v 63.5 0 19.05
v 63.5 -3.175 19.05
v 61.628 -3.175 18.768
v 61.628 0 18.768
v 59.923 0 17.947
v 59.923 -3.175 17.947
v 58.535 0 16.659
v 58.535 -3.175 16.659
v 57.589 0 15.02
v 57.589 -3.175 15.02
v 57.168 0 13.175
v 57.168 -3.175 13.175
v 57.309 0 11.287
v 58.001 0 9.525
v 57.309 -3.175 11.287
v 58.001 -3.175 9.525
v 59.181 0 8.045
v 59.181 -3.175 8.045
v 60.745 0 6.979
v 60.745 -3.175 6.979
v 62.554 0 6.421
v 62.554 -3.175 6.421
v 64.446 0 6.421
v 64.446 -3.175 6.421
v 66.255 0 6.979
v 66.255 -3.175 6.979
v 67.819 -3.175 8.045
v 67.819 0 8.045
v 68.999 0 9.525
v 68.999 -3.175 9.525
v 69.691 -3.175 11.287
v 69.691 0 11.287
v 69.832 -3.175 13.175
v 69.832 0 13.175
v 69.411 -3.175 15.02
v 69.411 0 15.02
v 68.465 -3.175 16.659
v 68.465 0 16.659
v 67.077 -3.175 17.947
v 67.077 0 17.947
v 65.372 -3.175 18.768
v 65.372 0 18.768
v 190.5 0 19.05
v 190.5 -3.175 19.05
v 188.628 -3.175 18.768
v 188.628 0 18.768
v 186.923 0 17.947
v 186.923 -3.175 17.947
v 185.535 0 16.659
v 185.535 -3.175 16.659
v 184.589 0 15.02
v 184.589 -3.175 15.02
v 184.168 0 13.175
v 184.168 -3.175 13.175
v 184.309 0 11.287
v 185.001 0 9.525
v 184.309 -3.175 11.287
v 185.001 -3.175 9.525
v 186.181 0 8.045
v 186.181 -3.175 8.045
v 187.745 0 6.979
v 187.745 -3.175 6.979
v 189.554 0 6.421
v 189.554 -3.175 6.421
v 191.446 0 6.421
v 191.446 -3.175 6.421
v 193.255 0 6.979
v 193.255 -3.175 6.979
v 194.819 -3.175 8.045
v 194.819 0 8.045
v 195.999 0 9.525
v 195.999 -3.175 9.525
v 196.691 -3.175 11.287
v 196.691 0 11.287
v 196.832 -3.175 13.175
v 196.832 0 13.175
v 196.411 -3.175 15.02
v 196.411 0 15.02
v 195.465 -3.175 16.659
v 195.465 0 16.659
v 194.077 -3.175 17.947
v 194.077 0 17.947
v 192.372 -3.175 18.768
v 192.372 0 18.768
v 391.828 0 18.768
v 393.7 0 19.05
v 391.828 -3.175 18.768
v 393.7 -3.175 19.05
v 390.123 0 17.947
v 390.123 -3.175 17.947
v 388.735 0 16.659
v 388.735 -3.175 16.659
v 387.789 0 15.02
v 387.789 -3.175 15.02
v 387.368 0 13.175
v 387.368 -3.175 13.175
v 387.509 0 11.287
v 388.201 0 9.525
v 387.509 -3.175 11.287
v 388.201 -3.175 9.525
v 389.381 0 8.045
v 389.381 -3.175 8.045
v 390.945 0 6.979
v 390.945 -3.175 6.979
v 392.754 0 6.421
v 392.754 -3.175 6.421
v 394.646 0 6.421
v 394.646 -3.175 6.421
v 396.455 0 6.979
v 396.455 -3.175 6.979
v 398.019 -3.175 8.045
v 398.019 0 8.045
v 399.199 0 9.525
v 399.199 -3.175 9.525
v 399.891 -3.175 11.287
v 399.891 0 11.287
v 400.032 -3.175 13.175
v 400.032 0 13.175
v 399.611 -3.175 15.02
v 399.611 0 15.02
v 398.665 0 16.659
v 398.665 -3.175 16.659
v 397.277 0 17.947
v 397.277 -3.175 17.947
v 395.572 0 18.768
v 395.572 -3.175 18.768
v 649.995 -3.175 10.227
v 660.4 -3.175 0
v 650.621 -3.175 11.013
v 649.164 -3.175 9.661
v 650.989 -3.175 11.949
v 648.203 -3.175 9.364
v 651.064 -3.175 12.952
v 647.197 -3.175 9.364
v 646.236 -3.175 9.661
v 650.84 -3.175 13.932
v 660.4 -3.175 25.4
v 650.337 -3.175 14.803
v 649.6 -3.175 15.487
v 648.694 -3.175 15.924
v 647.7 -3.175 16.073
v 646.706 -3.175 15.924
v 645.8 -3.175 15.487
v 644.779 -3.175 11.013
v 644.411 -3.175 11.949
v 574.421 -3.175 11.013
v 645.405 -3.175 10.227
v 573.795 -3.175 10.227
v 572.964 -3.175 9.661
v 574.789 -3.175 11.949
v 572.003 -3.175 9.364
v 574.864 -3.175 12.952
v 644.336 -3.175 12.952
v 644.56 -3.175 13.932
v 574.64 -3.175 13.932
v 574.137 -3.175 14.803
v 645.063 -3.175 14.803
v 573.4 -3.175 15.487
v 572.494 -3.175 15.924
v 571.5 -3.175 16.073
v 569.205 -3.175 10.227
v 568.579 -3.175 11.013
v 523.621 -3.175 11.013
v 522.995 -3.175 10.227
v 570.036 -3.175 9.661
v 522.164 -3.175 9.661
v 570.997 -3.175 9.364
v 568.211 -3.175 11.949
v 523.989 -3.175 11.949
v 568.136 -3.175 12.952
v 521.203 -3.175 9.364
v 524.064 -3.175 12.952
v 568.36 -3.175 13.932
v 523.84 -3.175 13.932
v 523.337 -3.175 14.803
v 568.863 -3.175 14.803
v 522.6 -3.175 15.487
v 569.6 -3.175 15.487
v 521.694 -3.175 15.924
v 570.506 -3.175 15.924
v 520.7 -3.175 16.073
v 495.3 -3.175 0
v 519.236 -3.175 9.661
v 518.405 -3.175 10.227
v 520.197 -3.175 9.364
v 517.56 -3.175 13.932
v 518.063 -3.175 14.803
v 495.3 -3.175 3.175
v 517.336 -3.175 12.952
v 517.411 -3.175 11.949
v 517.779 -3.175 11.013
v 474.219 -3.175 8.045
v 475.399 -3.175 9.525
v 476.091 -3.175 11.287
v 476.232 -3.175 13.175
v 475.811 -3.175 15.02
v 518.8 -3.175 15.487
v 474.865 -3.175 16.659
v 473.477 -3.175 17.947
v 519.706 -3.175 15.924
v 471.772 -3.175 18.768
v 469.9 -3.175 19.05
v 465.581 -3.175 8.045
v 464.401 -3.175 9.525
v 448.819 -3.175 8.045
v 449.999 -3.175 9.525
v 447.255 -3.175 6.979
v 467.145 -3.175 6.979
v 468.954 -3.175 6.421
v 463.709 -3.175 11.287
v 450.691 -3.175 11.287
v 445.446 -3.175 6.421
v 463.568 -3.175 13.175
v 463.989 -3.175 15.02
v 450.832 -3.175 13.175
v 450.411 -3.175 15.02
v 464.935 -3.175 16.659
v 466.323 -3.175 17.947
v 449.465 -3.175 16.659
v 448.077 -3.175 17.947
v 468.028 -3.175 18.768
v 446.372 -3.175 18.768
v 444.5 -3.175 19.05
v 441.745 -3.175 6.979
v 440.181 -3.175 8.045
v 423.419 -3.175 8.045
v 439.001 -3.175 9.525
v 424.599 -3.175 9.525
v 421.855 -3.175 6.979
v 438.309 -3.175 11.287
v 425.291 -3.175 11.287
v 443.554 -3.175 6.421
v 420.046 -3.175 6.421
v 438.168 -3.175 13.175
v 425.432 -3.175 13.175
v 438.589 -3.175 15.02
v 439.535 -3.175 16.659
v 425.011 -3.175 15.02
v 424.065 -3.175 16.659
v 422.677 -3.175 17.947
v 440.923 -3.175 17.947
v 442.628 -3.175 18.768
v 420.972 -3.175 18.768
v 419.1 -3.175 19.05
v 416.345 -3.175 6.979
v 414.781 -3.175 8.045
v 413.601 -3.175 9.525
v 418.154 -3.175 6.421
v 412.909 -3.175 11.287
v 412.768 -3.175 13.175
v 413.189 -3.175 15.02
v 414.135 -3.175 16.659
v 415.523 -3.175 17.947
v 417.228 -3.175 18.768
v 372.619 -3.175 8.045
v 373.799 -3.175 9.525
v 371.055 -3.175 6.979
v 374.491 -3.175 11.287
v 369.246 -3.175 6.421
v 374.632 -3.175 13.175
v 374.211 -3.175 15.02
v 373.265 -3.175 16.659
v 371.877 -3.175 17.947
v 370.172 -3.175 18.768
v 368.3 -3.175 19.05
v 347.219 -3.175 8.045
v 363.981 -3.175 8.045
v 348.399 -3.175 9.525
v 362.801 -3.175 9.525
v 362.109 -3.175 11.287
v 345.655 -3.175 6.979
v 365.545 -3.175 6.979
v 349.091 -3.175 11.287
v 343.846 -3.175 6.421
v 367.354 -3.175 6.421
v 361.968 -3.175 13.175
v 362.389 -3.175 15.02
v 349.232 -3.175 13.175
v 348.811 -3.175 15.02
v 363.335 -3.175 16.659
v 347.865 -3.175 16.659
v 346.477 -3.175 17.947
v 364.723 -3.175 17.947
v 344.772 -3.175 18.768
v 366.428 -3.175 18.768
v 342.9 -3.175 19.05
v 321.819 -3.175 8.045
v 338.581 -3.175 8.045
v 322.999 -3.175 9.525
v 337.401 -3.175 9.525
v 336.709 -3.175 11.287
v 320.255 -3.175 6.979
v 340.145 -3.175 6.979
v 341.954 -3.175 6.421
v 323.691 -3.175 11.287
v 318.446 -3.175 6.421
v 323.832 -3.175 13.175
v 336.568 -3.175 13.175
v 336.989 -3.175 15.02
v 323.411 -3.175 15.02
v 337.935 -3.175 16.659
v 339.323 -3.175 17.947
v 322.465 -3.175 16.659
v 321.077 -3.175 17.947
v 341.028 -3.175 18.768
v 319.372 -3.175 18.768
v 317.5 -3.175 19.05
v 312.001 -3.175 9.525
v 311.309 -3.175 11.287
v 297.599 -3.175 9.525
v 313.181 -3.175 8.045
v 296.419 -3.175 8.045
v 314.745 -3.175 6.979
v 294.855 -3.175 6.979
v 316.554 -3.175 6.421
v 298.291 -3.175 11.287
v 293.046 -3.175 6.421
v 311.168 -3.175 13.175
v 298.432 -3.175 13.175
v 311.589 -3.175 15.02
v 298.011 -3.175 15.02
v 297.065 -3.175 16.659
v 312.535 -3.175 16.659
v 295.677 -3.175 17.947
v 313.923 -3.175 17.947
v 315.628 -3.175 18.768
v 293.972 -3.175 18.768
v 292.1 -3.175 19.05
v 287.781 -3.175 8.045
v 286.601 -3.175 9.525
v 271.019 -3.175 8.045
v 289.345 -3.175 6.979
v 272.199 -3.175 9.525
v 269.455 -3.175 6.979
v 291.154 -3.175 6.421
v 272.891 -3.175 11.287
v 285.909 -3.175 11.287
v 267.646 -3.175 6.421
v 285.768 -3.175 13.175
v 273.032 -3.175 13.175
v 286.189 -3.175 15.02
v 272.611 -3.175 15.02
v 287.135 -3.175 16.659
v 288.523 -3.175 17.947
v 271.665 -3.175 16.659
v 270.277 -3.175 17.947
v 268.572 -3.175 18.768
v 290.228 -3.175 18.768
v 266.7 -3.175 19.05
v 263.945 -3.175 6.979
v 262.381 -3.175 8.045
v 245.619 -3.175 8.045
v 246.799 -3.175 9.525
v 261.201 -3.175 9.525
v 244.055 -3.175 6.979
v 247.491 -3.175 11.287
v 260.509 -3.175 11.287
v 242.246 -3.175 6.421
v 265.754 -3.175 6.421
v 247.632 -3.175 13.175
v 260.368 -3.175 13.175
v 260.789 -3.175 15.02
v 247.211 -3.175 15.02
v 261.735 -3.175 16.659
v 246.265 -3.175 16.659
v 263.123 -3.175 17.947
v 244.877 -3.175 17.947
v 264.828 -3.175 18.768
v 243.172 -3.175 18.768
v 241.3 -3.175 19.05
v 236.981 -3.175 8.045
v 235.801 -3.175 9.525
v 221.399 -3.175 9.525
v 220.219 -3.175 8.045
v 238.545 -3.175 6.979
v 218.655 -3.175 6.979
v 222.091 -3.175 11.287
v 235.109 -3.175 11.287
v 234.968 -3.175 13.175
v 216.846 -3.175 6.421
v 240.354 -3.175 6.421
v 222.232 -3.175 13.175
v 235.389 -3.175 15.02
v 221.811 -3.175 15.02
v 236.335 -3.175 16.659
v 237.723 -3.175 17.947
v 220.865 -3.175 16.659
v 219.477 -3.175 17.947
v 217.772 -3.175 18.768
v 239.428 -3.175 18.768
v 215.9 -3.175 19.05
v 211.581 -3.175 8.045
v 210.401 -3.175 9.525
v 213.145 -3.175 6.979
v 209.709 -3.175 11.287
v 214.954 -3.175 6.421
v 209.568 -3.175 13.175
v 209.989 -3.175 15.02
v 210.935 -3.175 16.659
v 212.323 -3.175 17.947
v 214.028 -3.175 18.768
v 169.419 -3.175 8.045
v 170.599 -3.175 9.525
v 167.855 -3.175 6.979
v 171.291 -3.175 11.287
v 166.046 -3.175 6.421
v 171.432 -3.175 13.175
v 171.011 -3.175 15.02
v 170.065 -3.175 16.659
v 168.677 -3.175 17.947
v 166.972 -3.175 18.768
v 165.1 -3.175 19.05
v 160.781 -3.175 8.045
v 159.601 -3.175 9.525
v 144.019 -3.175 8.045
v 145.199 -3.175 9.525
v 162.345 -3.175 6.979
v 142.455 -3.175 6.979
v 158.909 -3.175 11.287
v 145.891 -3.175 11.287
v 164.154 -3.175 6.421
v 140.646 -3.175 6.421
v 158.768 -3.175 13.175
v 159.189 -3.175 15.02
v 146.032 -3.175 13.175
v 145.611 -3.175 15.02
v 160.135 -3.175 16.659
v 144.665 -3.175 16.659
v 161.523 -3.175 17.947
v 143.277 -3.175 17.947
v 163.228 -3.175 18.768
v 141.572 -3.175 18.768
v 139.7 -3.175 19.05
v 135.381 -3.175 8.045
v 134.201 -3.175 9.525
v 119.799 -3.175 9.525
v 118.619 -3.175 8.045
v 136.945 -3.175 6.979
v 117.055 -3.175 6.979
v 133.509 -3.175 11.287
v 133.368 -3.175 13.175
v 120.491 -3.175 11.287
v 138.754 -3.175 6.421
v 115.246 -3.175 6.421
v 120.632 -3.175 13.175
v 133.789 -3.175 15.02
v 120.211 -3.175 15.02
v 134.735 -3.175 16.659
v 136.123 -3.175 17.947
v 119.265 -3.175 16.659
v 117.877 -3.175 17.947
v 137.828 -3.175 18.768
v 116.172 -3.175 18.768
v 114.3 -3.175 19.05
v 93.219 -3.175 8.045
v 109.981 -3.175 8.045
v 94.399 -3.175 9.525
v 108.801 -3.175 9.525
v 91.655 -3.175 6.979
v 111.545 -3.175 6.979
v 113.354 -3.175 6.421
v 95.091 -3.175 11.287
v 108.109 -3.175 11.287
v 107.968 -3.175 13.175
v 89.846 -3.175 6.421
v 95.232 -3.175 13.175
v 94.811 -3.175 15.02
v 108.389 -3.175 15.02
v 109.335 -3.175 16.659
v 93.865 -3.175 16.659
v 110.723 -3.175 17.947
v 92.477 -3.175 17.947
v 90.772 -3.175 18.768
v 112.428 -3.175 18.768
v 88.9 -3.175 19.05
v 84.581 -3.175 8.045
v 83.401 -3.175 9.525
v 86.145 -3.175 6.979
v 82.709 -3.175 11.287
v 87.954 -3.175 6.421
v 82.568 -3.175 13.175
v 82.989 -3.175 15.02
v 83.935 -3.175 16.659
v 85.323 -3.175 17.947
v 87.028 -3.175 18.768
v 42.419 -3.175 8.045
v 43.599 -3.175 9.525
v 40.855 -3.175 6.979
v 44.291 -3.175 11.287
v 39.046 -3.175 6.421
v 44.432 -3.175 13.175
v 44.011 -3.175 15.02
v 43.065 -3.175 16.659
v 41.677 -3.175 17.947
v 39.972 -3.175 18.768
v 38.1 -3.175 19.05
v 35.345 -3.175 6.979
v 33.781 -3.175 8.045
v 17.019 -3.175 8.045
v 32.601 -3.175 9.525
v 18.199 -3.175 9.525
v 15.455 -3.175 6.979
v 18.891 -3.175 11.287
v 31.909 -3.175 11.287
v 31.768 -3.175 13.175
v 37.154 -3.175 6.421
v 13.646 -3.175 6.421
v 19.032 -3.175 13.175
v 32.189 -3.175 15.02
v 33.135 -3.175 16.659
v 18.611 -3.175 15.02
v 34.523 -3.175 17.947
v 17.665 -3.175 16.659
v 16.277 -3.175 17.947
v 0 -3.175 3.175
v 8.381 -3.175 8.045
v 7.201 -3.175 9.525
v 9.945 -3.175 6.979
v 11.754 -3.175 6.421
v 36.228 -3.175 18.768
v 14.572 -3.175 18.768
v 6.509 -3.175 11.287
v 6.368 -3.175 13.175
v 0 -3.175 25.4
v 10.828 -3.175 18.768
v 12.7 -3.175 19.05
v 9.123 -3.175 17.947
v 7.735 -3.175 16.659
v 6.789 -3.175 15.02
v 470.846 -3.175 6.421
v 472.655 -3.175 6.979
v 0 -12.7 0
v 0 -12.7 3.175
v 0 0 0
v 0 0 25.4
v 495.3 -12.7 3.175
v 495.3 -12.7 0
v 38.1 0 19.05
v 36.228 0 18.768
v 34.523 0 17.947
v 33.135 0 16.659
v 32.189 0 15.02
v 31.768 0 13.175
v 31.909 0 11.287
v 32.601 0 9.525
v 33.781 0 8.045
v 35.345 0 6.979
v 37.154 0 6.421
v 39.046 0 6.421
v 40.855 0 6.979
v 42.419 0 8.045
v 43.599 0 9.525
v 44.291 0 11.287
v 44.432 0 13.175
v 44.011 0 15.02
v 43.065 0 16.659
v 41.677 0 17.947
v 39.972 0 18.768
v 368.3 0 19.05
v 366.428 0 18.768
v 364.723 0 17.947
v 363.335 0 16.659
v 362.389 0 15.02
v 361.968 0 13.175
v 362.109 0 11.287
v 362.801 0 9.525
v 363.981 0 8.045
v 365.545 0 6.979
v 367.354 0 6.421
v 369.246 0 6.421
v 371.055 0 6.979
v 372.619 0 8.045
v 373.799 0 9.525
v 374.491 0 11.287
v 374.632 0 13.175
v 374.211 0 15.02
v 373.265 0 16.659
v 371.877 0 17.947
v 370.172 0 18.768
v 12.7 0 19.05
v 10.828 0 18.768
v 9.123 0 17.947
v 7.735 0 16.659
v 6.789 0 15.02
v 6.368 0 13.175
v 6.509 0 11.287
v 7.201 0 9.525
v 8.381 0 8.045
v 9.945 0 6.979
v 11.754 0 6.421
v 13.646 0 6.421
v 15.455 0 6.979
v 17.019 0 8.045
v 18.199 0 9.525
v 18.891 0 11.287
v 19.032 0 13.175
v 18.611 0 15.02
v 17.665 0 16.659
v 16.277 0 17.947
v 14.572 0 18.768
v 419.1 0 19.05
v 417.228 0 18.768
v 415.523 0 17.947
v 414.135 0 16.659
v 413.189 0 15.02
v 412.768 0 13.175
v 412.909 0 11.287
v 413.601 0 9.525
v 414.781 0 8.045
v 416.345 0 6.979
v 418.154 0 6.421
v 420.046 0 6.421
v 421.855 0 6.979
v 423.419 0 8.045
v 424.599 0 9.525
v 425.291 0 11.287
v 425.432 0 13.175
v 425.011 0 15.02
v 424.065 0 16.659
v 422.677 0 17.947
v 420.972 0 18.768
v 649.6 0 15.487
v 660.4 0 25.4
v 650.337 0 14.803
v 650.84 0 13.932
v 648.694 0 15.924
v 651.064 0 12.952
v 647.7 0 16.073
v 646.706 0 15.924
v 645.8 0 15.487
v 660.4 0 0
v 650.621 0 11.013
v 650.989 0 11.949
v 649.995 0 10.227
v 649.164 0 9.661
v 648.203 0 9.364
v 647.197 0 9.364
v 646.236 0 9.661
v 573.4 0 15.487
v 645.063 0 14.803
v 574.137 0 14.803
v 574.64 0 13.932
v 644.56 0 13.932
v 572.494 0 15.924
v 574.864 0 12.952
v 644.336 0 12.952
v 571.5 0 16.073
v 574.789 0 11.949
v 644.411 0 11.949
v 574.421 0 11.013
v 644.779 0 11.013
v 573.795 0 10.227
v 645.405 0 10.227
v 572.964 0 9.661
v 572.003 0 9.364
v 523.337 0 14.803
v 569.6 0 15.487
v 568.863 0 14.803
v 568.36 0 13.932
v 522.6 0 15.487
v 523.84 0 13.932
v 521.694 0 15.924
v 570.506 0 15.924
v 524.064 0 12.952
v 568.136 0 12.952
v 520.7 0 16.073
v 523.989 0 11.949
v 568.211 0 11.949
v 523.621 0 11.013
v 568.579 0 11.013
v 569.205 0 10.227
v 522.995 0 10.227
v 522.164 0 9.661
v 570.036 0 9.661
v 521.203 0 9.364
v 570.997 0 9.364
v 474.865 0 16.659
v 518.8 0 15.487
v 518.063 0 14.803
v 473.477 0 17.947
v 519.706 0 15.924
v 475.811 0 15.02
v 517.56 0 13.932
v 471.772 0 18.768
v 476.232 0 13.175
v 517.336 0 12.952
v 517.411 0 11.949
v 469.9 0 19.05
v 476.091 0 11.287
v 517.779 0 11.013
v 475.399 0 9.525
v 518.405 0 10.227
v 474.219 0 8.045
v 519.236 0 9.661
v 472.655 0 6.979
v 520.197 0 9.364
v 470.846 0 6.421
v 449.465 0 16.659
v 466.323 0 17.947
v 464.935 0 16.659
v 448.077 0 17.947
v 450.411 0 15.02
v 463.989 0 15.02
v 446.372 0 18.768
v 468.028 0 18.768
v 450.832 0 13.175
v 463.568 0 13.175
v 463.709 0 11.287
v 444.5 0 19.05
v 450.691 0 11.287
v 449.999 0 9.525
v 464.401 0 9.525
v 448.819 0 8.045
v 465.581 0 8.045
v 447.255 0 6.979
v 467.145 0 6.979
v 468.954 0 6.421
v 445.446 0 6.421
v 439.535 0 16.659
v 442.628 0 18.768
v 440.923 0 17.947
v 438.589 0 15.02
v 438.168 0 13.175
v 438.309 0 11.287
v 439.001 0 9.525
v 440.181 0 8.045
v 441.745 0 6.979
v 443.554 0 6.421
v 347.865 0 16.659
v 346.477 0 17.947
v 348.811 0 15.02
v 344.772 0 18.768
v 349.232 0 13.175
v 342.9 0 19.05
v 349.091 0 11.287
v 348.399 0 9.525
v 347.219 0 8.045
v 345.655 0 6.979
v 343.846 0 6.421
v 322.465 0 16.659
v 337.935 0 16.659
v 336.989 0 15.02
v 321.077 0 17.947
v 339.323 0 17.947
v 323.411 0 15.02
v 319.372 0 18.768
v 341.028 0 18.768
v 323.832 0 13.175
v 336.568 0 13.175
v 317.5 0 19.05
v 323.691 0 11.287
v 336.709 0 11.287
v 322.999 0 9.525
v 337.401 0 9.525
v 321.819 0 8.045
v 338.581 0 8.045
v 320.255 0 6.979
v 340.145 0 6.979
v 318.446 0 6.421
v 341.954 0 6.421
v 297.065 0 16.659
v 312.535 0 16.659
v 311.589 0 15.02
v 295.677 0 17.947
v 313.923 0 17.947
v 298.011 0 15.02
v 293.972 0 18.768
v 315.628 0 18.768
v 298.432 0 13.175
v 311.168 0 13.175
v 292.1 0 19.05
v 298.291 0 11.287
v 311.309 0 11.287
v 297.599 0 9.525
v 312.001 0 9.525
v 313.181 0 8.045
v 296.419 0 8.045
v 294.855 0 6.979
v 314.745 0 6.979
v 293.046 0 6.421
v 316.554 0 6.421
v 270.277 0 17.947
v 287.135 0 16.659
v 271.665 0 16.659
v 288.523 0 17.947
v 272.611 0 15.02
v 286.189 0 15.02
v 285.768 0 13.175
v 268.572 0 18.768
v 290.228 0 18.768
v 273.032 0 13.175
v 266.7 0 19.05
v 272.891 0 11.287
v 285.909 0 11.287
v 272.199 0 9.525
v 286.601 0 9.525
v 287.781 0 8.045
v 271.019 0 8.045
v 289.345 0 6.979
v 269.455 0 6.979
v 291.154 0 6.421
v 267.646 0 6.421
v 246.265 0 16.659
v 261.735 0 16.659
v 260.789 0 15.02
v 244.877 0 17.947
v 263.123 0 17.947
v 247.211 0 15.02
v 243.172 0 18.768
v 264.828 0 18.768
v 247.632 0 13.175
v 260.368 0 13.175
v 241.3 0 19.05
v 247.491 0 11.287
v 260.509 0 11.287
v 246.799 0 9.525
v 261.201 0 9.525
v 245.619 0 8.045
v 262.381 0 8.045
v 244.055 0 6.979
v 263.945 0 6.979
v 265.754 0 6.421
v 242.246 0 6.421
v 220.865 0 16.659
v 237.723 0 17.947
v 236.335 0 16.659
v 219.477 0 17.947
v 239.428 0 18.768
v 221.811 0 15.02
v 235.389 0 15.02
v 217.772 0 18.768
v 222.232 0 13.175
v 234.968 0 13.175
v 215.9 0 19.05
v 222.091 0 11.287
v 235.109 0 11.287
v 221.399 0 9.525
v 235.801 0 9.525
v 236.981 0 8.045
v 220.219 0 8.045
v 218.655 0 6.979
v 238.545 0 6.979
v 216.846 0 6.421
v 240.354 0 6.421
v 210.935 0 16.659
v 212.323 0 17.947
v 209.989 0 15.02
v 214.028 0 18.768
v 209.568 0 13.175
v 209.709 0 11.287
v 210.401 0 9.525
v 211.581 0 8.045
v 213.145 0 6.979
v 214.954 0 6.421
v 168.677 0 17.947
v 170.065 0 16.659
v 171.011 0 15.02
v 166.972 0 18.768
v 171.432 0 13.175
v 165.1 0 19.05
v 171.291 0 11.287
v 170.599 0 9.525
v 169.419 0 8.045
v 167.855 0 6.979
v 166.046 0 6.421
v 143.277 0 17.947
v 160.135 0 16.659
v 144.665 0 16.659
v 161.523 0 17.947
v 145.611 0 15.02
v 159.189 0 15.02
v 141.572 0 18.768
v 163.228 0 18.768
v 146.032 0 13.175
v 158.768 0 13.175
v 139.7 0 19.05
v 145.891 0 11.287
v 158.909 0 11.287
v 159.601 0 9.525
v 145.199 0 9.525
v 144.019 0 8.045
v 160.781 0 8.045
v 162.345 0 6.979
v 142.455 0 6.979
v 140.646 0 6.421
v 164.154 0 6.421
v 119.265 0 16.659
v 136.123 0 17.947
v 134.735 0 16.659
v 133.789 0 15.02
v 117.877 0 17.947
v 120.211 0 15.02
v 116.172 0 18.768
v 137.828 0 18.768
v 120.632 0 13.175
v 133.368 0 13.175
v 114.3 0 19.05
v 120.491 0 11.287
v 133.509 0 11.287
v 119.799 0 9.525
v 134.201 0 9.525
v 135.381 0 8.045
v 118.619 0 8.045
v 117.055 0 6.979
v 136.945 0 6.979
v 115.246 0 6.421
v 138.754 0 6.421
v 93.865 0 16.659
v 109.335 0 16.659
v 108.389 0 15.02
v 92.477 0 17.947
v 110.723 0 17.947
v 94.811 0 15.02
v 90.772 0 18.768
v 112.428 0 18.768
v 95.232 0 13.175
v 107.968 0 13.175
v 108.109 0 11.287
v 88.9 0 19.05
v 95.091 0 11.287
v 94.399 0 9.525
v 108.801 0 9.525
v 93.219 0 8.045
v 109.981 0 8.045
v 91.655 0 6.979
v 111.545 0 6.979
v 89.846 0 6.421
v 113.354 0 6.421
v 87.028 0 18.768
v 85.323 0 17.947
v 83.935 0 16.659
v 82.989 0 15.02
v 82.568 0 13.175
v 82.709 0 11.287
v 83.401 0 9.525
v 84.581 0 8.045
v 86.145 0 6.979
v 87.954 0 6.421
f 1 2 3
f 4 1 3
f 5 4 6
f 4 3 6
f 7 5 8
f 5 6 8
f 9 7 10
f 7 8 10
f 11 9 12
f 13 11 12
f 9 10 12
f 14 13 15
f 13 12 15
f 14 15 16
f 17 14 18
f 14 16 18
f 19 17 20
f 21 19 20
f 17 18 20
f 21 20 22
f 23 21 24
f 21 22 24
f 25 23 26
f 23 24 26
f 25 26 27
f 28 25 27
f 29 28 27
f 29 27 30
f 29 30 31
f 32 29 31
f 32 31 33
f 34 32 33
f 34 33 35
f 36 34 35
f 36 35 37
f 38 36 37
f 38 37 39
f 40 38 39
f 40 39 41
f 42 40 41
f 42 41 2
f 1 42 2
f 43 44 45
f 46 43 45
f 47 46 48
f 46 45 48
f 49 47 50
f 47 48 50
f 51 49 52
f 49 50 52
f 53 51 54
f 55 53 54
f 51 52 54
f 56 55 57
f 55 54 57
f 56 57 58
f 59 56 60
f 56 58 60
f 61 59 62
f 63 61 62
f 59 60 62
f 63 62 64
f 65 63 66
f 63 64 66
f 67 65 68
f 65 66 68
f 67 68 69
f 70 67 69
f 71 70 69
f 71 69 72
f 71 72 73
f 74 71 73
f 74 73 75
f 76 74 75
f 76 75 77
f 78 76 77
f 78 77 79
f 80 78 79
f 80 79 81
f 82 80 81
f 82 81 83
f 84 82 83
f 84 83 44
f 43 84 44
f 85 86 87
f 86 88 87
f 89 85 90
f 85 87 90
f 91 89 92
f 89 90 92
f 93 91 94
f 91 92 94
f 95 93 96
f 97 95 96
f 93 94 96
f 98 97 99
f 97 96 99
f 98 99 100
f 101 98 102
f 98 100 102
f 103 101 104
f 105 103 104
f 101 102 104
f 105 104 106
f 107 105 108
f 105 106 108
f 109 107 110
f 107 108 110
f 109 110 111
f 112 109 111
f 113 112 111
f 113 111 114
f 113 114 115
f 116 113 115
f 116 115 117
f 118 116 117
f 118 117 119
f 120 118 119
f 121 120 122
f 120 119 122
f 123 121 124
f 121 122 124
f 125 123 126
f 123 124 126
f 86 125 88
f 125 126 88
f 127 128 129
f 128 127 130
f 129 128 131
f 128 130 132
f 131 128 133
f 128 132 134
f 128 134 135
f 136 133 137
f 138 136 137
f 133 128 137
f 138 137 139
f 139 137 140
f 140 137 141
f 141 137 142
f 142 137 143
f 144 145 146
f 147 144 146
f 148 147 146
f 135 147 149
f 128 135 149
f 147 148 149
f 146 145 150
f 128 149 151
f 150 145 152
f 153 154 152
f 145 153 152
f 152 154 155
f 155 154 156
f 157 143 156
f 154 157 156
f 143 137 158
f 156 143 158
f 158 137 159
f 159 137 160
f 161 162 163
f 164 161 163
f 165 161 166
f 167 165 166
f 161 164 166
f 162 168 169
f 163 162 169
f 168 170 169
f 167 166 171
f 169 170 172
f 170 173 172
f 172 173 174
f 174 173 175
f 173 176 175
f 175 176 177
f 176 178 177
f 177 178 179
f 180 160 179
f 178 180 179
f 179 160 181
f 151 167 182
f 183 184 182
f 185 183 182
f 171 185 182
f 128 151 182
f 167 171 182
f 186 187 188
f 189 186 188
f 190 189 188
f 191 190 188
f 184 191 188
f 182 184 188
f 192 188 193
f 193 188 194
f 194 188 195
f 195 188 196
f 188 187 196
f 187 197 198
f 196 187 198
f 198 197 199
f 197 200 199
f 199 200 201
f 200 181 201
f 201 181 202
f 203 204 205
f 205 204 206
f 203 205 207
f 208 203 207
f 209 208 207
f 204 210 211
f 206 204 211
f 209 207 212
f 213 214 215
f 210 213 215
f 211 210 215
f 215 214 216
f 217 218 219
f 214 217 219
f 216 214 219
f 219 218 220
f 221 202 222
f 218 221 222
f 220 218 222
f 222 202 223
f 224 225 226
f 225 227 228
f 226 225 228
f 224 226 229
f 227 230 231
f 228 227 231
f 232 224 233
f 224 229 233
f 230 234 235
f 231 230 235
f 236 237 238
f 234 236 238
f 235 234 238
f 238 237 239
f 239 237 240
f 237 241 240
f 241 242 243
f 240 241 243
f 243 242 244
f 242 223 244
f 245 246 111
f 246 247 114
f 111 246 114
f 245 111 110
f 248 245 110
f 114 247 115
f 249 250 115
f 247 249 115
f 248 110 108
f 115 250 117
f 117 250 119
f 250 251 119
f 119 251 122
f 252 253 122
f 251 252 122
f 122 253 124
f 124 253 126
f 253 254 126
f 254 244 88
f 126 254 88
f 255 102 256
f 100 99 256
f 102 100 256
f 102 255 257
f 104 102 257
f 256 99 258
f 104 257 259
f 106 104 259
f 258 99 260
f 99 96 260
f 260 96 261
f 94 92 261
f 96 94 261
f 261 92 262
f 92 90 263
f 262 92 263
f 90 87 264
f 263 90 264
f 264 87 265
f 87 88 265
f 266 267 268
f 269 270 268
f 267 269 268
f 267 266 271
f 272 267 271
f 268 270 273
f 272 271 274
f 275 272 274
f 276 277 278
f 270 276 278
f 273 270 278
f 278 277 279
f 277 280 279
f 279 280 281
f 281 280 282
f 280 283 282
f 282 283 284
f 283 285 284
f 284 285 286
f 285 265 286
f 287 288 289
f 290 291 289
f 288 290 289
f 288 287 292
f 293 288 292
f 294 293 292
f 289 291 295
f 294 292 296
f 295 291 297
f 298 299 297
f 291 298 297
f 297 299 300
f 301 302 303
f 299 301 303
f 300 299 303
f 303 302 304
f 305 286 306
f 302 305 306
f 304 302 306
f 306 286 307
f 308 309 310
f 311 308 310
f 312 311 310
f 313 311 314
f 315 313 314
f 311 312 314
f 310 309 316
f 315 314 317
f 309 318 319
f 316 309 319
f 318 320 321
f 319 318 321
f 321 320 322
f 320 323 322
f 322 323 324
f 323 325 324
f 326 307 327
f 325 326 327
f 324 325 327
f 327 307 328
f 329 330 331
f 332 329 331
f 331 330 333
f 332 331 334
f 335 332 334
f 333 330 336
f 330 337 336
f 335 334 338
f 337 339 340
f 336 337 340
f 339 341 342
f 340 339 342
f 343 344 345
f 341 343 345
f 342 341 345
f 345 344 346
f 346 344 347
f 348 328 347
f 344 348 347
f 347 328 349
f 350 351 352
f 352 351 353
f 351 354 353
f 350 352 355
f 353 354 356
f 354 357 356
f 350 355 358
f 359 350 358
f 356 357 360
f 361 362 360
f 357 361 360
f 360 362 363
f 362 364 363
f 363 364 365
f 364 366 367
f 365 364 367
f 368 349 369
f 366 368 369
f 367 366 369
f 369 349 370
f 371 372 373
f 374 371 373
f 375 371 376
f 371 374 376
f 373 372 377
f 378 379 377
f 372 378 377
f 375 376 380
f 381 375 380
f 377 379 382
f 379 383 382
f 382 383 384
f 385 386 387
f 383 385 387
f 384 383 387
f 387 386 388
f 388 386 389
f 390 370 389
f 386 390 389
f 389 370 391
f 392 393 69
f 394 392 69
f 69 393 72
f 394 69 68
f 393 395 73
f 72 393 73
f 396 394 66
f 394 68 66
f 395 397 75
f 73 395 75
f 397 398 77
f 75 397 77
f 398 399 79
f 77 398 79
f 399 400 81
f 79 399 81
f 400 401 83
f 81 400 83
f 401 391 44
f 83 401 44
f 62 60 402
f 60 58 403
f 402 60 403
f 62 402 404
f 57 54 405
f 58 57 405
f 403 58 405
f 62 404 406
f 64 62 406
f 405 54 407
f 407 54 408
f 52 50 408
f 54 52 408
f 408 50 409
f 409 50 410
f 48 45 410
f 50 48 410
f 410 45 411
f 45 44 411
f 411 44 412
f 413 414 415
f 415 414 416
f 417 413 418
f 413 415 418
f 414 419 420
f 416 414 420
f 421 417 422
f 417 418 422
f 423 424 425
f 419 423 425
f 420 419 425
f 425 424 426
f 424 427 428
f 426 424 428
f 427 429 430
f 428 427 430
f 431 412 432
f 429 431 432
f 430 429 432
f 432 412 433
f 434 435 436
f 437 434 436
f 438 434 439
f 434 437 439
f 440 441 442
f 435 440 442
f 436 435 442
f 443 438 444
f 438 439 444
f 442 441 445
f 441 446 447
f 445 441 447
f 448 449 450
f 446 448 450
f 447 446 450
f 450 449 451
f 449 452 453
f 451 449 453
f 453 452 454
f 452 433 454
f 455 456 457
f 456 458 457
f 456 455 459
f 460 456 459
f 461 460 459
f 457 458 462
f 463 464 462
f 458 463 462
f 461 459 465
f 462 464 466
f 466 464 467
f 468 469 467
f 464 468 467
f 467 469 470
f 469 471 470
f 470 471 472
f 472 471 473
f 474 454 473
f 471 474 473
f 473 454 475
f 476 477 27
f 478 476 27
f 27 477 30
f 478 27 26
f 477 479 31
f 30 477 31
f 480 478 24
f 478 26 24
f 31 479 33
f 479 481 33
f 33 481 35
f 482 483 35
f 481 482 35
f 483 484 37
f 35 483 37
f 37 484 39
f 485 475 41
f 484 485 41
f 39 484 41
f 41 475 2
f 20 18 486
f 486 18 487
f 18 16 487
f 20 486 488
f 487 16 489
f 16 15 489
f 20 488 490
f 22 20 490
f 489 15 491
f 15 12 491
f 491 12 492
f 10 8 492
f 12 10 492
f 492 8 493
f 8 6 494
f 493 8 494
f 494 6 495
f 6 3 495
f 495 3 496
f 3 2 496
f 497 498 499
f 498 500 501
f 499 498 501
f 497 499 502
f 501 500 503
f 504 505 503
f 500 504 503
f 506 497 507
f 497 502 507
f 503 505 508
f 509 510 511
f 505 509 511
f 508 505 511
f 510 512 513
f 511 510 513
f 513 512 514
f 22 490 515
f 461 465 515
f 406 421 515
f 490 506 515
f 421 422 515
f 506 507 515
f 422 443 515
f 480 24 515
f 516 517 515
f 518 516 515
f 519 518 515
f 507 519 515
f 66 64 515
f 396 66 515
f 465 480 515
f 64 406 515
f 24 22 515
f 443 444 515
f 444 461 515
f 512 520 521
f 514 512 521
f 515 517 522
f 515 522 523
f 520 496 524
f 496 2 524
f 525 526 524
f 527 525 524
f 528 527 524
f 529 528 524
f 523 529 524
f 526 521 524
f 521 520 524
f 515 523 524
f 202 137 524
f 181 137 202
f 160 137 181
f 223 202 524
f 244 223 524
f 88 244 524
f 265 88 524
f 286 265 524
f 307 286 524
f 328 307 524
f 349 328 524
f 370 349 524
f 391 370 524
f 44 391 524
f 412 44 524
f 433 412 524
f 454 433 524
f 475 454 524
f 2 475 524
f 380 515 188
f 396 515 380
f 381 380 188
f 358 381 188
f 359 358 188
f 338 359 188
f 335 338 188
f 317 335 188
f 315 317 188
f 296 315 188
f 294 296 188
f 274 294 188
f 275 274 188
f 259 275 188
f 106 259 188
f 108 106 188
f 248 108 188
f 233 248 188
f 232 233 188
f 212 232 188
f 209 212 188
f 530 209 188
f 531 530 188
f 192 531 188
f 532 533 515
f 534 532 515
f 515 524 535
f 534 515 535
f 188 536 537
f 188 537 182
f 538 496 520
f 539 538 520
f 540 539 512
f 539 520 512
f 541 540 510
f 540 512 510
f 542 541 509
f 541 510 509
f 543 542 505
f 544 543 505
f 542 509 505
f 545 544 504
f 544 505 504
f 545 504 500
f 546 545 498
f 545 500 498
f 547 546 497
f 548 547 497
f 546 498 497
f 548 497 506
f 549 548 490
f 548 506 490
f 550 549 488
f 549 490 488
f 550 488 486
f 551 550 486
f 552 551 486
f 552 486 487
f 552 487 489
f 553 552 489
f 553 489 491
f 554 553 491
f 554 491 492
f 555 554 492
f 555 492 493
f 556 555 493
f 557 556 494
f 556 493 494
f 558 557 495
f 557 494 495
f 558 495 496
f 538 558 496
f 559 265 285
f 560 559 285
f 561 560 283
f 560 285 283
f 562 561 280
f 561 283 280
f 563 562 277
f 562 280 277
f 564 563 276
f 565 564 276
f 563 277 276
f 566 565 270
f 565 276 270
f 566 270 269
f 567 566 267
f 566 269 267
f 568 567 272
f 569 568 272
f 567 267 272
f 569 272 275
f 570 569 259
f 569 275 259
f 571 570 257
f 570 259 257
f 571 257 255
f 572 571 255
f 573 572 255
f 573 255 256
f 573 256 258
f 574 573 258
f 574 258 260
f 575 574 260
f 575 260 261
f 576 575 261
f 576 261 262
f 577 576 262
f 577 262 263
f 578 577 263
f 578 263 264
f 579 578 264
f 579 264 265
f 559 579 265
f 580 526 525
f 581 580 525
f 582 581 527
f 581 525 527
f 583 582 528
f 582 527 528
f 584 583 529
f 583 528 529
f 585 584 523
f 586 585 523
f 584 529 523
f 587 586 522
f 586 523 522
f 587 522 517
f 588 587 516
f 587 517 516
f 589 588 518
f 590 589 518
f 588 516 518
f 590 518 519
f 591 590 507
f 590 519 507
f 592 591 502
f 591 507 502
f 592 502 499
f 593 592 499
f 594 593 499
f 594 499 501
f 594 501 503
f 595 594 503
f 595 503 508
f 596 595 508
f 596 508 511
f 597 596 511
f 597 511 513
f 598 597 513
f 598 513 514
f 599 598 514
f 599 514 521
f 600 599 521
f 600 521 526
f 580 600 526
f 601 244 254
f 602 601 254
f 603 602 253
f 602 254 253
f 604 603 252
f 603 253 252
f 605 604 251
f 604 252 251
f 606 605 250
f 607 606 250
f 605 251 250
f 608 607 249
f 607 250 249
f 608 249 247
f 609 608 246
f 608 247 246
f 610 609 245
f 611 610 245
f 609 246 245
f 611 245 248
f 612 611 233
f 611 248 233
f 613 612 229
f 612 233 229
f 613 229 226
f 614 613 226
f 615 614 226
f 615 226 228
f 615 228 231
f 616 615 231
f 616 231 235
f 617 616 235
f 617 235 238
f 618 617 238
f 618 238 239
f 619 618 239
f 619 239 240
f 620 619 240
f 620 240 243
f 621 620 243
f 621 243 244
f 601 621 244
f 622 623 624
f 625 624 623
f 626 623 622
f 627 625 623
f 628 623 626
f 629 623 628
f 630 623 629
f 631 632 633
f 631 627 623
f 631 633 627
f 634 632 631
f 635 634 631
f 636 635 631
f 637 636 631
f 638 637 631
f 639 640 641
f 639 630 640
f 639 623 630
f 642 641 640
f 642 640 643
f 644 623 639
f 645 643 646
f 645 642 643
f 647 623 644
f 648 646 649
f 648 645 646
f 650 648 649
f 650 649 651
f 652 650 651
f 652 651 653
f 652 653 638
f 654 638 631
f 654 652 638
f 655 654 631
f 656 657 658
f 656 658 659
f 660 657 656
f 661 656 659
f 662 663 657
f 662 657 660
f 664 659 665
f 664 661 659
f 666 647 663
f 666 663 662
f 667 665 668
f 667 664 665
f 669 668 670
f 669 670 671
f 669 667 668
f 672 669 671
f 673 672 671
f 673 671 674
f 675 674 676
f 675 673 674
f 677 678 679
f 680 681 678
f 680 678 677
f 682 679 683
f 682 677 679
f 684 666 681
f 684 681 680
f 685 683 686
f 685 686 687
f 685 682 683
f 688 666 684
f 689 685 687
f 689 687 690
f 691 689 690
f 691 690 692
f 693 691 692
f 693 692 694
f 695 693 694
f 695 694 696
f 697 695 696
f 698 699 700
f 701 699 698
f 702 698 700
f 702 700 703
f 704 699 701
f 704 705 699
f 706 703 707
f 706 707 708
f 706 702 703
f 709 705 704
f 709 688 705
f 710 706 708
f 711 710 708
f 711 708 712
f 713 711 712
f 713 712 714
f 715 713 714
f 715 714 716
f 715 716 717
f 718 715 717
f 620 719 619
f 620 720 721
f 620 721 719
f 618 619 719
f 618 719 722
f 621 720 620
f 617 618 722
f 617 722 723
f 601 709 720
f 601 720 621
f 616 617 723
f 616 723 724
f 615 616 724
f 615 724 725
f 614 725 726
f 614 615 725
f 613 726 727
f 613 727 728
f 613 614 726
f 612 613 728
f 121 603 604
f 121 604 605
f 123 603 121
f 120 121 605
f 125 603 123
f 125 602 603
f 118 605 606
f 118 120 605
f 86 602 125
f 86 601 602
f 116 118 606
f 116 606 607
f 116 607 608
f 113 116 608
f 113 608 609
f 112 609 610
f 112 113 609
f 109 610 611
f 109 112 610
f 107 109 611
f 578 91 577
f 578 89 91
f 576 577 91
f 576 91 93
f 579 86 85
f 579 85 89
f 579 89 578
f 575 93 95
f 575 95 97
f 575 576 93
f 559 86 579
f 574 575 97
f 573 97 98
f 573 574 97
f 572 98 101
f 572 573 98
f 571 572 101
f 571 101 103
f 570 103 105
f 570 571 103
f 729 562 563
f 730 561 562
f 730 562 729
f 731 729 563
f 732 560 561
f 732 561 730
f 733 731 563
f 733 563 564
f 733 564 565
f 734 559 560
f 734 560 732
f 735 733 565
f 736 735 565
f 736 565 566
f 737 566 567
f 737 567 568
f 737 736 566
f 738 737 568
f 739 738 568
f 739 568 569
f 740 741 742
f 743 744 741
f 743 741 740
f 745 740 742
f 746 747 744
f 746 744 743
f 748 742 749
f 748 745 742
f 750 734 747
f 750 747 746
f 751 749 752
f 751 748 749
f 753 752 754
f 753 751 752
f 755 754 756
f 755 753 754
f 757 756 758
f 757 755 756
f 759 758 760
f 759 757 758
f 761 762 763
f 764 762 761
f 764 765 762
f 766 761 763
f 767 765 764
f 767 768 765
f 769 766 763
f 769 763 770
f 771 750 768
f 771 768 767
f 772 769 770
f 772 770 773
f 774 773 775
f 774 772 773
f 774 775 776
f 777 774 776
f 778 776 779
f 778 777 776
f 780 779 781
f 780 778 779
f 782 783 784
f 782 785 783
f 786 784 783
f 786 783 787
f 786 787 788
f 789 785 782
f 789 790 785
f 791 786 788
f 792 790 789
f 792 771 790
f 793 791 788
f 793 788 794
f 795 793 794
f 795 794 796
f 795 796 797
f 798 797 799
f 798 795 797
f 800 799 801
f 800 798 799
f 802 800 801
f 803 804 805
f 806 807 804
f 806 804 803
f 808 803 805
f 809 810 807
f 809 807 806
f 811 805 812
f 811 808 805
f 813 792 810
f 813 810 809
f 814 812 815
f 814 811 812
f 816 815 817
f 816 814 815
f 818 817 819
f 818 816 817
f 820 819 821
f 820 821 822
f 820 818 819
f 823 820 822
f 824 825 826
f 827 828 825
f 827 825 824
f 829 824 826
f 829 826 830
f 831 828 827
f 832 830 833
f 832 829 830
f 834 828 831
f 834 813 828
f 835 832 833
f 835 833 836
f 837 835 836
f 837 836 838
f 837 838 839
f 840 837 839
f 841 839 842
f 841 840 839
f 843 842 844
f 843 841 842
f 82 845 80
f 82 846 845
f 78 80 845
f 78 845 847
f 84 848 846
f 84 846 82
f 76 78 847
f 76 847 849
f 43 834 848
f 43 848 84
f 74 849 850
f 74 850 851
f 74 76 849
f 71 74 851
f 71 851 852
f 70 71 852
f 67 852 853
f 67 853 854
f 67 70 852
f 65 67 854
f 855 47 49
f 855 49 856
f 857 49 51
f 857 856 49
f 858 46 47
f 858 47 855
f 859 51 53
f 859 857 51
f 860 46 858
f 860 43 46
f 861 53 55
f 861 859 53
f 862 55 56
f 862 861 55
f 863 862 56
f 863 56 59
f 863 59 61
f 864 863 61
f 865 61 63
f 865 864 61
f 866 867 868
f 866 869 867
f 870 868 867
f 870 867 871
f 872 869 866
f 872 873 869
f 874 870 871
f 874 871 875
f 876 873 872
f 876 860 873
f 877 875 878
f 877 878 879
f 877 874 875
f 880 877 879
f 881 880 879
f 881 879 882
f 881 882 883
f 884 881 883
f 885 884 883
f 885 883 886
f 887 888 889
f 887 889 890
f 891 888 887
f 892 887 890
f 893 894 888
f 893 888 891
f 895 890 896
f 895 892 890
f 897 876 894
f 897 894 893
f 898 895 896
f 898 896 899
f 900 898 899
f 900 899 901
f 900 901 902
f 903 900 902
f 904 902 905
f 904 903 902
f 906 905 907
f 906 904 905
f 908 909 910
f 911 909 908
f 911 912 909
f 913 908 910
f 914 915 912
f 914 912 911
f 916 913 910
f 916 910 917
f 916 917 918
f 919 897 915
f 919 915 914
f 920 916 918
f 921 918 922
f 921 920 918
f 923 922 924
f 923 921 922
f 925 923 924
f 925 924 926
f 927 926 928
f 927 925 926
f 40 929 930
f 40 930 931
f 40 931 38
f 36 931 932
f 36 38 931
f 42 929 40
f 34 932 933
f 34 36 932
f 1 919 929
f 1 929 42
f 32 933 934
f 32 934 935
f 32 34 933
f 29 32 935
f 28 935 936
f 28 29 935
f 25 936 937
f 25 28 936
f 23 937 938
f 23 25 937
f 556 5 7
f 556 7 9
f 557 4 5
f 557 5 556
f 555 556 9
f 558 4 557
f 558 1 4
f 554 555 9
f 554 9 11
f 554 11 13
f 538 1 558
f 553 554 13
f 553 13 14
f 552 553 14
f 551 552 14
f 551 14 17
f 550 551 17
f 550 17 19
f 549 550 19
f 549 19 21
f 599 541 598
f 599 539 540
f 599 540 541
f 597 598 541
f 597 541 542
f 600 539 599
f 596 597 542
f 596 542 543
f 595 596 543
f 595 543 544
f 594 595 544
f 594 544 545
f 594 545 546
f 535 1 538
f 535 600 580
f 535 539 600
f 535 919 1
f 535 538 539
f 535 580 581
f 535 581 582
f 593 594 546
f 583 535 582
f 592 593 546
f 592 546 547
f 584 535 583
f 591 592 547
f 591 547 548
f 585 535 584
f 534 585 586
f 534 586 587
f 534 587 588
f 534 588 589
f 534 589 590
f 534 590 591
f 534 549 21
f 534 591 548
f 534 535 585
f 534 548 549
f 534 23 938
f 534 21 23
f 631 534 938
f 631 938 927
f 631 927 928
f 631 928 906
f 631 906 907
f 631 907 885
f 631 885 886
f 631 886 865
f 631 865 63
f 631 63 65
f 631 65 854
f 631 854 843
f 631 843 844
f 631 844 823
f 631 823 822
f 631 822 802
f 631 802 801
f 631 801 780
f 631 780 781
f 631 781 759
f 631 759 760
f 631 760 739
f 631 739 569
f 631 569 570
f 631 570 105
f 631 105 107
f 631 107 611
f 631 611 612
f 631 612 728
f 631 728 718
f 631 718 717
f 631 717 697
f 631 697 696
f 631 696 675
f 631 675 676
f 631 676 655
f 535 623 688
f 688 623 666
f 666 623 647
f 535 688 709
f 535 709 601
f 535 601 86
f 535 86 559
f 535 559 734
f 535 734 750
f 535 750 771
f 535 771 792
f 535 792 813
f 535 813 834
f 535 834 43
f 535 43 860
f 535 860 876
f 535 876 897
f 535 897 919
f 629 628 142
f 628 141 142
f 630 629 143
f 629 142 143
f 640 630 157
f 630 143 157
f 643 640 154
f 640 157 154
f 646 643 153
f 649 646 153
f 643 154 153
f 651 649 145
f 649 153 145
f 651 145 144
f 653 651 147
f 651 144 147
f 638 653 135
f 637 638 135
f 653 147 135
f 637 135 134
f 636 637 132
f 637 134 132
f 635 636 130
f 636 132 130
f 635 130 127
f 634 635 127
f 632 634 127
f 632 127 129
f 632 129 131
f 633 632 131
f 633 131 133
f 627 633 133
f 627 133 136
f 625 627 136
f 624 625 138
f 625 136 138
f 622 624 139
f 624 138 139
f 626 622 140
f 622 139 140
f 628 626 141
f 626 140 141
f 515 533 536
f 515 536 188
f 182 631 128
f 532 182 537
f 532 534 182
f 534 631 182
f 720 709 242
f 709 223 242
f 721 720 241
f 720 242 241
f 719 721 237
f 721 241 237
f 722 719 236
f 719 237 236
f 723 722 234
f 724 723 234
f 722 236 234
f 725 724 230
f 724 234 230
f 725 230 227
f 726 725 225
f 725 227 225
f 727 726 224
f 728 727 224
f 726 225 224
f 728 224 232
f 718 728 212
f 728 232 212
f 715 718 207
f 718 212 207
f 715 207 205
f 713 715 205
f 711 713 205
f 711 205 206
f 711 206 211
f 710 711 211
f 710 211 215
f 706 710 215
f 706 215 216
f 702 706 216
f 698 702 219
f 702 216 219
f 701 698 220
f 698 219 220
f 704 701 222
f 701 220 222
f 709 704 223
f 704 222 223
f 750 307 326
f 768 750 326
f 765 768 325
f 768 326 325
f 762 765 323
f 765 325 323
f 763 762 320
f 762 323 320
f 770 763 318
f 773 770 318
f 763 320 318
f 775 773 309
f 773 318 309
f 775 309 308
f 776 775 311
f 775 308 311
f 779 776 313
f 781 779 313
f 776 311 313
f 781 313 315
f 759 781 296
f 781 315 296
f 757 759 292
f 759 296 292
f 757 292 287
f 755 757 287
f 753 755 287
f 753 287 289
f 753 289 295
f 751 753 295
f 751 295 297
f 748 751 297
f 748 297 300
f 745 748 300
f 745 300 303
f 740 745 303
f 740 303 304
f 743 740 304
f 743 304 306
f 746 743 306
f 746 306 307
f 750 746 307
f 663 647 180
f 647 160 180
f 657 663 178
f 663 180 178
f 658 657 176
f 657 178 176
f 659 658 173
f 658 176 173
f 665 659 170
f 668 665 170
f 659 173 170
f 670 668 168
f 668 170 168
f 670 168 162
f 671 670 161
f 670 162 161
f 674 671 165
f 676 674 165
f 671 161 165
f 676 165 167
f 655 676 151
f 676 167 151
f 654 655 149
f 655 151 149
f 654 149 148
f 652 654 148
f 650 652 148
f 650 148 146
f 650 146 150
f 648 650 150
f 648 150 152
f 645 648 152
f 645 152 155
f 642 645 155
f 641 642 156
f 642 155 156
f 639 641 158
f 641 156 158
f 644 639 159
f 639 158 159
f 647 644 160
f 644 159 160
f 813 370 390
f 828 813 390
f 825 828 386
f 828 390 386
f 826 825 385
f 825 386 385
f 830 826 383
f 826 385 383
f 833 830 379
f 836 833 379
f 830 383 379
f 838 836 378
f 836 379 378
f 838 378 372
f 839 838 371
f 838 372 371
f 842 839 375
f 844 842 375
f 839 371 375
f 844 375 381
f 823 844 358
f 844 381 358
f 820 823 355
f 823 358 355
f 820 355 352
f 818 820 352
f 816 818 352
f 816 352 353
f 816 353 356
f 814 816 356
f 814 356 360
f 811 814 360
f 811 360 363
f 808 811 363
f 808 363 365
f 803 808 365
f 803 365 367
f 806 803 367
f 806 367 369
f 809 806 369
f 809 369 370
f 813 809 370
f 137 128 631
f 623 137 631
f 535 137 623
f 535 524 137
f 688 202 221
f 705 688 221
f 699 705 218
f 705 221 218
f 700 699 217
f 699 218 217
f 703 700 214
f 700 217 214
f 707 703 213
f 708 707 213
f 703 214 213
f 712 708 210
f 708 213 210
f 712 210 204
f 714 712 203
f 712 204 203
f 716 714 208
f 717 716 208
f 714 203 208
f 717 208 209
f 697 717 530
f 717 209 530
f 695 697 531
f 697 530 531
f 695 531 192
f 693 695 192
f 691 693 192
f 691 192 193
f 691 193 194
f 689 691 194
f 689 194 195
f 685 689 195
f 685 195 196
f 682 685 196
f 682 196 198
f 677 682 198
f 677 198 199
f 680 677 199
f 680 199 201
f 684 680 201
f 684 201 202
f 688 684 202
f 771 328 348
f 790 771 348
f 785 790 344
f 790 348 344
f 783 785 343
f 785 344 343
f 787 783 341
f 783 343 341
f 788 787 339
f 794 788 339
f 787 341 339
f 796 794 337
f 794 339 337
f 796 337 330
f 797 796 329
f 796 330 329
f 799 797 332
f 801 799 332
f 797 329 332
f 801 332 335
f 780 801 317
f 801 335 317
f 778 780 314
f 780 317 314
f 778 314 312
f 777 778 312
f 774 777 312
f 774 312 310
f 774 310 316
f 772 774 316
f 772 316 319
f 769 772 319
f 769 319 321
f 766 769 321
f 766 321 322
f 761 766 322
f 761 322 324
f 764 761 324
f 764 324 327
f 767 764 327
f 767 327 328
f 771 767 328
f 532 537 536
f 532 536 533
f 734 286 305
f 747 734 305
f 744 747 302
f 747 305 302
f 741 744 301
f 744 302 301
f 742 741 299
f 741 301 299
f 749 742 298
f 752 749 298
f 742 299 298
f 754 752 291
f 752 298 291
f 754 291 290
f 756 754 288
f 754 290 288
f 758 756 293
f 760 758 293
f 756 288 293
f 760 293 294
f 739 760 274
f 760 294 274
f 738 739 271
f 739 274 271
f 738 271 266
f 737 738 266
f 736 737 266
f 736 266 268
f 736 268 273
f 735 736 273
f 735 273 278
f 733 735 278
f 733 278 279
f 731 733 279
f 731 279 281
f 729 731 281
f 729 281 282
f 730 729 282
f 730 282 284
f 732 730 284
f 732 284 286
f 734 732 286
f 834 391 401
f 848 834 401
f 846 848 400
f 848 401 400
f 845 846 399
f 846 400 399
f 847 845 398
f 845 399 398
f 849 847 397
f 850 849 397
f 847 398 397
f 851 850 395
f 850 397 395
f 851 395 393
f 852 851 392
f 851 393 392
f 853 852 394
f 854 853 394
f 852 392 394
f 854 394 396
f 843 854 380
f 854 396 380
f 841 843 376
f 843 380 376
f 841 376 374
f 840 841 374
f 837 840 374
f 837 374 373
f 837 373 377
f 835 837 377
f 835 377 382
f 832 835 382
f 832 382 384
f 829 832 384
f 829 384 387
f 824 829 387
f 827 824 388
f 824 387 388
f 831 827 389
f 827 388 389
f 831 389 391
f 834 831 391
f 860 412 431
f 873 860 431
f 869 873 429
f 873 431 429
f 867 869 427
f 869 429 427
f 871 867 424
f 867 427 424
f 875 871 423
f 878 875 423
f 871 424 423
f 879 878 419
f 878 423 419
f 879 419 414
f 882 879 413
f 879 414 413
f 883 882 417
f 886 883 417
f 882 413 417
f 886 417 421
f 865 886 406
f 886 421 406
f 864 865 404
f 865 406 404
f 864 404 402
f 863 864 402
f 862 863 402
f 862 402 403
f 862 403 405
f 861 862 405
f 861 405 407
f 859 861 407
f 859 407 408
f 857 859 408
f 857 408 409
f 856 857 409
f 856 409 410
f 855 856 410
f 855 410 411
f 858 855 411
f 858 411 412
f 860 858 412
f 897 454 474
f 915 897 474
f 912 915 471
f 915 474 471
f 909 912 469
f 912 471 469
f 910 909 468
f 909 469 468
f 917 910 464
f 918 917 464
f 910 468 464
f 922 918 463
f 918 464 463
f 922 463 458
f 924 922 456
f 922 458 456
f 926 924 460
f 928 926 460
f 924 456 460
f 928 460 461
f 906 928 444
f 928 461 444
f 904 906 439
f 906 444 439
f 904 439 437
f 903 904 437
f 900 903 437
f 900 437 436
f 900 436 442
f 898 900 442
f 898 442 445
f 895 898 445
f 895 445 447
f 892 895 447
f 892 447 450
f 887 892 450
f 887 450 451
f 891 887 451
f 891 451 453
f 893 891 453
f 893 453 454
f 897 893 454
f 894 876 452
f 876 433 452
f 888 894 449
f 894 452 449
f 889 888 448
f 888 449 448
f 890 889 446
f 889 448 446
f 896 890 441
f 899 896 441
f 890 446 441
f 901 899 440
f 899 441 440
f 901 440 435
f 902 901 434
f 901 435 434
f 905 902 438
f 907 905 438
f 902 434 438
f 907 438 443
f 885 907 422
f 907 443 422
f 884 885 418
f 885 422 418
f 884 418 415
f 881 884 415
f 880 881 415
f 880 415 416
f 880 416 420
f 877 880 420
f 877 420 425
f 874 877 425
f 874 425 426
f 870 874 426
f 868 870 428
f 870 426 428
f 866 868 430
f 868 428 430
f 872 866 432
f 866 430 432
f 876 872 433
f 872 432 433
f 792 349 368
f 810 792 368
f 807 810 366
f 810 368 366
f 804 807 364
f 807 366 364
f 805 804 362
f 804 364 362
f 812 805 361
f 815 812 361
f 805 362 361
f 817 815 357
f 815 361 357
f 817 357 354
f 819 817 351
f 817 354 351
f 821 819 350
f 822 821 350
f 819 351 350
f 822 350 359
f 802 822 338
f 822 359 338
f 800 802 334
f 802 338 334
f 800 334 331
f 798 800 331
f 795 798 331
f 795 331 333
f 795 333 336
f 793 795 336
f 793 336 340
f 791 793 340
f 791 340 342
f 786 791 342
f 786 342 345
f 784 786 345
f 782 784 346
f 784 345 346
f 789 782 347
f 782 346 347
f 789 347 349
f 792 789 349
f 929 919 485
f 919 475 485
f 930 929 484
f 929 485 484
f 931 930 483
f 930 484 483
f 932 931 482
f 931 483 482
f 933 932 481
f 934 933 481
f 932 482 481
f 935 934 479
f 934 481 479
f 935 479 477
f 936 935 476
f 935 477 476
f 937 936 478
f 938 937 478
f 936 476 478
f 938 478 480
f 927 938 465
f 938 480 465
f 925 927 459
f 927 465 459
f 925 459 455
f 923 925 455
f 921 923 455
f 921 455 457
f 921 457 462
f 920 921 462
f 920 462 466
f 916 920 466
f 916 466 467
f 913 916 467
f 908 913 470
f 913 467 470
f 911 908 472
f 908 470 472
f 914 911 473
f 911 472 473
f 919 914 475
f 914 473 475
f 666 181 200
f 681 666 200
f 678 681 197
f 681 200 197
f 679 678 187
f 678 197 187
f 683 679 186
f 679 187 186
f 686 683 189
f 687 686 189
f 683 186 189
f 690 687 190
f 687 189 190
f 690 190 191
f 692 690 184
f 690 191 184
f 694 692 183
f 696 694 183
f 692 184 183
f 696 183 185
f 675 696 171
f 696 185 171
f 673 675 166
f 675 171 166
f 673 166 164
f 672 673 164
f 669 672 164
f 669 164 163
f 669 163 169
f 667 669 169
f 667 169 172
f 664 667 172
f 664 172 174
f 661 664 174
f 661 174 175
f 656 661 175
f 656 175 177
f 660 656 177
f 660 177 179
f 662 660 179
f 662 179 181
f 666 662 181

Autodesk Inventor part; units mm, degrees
ref_plane "YZ Plane" through (0, 0, 0) normal (1, 0, 0) x (0, 1, 0)
ref_plane "XZ Plane" through (0, 0, 0) normal (0, 1, 0) x (-1, 0, 0)
ref_plane "XY Plane" through (0, 0, 0) normal (0, 0, 1) x (1, 0, 0)
sketch "Sketch1" plane through (0, 0, 0) normal (1, 0, 0) x (0, 1, 0)
  line L0 (0, 0) -> (-3.175, 0)
  line L1 (-3.175, 0) -> (-3.175, 25.4)
  line L2 (-3.175, 25.4) -> (0, 25.4)
  line L3 (0, 25.4) -> (0, 0)
  line L4 (0, 0) -> (-25.4, 0)
  line L5 (-25.4, 0) -> (-25.4, 3.175)
  line L6 (-25.4, 3.175) -> (0, 3.175)
  line L7 (0, 3.175) -> (0, 0)
  dimension "d0" = 3.175
  dimension "d1" = 25.4
  dimension "d2" = 25.4
  dimension "d3" = 3.175
extrude "Extrusion1" add sketch "Sketch1" along normal blind 660.4
sketch "Sketch2" plane through (0, -25.4, 3.175) normal (0, 0, 1) x (1, 0, 0)
  line L0 (660.4, 22.225) -> (0, 22.225) projected
  line L1 (0, 22.225) -> (0, 0) projected
  line L2 (0, 0) -> (660.4, 0) projected
  line L3 (660.4, 22.225) -> (660.4, 0) projected
  line L4 (660.4, 0) -> (495.3, 0)
  line L5 (495.3, 0) -> (495.3, 22.225)
  line L6 (495.3, 22.225) -> (660.4, 22.225)
  line L7 (660.4, 22.225) -> (660.4, 0)
  point P0 (0, 25.4)
  dimension "d6" = 165.1
  dimension "d7" = 22.225
extrude "Extrusion2" cut sketch "Sketch2" against normal blind 25.4 contours L3 L2 L5 L0
sketch "Sketch3" plane through (0, 0, 25.4) normal (0, 1, 0) x (1, 0, 0)
  line L0 (0, 25.4) -> (0, 0) projected
  line L1 (0, 0) -> (660.4, 0) projected
  line L2 (660.4, 25.4) -> (660.4, 0) projected
  line L3 (0, 25.4) -> (660.4, 25.4) projected
  point P0 (647.7, 12.7)
  point P1 (520.7, 12.7)
  point P2 (571.5, 12.7)
  dimension "d10" = 12.7
  dimension "d11" = 12.7
  dimension "d12" = 139.7
  dimension "d13" = 12.7
  dimension "d37" = 88.9
  dimension "d38" = 12.7
sketch "Sketch4" plane through (0, -25.4, 0) normal (0, 0, -1) x (-1, 0, 0)
  line L0 (-660.4, 22.225) -> (-495.3, 22.225) projected
  line L1 (-495.3, 22.225) -> (-495.3, 0) projected
  line L2 (0, 0) -> (-495.3, 0) projected
  line L3 (0, 0) -> (0, 25.4) projected
  line L4 (0, 25.4) -> (-660.4, 25.4) projected
  line L5 (-660.4, 22.225) -> (-660.4, 25.4) projected
  line L6 (0, 0) -> (-495.3, 0)
  line L7 (-495.3, 0) -> (-495.3, 12.7)
  line L8 (-495.3, 12.7) -> (0, 12.7)
  line L9 (0, 12.7) -> (0, 0)
  dimension "d21" = 495.3
  dimension "d22" = 12.7
extrude "Extrusion3" cut sketch "Sketch4" against normal blind 25.4 contours L8 L3 L2 L1
sketch "Sketch5" plane through (0, 0, 25.4) normal (0, 1, 0) x (1, 0, 0)
  line L0 (0, 25.4) -> (0, 0) projected
  line L1 (0, 0) -> (660.4, 0) projected
  line L2 (660.4, 25.4) -> (660.4, 0) projected
  line L3 (0, 25.4) -> (660.4, 25.4) projected
  point P0 (12.7, 12.7)
  dimension "d25" = 12.7
  dimension "d26" = 12.7
hole "Hole2" at (12.7, 0, 12.7) direction (0, -1, 0) diameter 12.7 end through all
pattern_linear "Rectangular Pattern1" count 19 spacing 25.4 along (1, 0, 0) of "Hole2"
hole "Hole3" at (647.7, 0, 12.7) at (520.7, 0, 12.7) at (571.5, 0, 12.7) direction (0, -1, 0) diameter 6.7469 end through all
properties part number "bottom clamper arm" material "Aluminum 6061"
